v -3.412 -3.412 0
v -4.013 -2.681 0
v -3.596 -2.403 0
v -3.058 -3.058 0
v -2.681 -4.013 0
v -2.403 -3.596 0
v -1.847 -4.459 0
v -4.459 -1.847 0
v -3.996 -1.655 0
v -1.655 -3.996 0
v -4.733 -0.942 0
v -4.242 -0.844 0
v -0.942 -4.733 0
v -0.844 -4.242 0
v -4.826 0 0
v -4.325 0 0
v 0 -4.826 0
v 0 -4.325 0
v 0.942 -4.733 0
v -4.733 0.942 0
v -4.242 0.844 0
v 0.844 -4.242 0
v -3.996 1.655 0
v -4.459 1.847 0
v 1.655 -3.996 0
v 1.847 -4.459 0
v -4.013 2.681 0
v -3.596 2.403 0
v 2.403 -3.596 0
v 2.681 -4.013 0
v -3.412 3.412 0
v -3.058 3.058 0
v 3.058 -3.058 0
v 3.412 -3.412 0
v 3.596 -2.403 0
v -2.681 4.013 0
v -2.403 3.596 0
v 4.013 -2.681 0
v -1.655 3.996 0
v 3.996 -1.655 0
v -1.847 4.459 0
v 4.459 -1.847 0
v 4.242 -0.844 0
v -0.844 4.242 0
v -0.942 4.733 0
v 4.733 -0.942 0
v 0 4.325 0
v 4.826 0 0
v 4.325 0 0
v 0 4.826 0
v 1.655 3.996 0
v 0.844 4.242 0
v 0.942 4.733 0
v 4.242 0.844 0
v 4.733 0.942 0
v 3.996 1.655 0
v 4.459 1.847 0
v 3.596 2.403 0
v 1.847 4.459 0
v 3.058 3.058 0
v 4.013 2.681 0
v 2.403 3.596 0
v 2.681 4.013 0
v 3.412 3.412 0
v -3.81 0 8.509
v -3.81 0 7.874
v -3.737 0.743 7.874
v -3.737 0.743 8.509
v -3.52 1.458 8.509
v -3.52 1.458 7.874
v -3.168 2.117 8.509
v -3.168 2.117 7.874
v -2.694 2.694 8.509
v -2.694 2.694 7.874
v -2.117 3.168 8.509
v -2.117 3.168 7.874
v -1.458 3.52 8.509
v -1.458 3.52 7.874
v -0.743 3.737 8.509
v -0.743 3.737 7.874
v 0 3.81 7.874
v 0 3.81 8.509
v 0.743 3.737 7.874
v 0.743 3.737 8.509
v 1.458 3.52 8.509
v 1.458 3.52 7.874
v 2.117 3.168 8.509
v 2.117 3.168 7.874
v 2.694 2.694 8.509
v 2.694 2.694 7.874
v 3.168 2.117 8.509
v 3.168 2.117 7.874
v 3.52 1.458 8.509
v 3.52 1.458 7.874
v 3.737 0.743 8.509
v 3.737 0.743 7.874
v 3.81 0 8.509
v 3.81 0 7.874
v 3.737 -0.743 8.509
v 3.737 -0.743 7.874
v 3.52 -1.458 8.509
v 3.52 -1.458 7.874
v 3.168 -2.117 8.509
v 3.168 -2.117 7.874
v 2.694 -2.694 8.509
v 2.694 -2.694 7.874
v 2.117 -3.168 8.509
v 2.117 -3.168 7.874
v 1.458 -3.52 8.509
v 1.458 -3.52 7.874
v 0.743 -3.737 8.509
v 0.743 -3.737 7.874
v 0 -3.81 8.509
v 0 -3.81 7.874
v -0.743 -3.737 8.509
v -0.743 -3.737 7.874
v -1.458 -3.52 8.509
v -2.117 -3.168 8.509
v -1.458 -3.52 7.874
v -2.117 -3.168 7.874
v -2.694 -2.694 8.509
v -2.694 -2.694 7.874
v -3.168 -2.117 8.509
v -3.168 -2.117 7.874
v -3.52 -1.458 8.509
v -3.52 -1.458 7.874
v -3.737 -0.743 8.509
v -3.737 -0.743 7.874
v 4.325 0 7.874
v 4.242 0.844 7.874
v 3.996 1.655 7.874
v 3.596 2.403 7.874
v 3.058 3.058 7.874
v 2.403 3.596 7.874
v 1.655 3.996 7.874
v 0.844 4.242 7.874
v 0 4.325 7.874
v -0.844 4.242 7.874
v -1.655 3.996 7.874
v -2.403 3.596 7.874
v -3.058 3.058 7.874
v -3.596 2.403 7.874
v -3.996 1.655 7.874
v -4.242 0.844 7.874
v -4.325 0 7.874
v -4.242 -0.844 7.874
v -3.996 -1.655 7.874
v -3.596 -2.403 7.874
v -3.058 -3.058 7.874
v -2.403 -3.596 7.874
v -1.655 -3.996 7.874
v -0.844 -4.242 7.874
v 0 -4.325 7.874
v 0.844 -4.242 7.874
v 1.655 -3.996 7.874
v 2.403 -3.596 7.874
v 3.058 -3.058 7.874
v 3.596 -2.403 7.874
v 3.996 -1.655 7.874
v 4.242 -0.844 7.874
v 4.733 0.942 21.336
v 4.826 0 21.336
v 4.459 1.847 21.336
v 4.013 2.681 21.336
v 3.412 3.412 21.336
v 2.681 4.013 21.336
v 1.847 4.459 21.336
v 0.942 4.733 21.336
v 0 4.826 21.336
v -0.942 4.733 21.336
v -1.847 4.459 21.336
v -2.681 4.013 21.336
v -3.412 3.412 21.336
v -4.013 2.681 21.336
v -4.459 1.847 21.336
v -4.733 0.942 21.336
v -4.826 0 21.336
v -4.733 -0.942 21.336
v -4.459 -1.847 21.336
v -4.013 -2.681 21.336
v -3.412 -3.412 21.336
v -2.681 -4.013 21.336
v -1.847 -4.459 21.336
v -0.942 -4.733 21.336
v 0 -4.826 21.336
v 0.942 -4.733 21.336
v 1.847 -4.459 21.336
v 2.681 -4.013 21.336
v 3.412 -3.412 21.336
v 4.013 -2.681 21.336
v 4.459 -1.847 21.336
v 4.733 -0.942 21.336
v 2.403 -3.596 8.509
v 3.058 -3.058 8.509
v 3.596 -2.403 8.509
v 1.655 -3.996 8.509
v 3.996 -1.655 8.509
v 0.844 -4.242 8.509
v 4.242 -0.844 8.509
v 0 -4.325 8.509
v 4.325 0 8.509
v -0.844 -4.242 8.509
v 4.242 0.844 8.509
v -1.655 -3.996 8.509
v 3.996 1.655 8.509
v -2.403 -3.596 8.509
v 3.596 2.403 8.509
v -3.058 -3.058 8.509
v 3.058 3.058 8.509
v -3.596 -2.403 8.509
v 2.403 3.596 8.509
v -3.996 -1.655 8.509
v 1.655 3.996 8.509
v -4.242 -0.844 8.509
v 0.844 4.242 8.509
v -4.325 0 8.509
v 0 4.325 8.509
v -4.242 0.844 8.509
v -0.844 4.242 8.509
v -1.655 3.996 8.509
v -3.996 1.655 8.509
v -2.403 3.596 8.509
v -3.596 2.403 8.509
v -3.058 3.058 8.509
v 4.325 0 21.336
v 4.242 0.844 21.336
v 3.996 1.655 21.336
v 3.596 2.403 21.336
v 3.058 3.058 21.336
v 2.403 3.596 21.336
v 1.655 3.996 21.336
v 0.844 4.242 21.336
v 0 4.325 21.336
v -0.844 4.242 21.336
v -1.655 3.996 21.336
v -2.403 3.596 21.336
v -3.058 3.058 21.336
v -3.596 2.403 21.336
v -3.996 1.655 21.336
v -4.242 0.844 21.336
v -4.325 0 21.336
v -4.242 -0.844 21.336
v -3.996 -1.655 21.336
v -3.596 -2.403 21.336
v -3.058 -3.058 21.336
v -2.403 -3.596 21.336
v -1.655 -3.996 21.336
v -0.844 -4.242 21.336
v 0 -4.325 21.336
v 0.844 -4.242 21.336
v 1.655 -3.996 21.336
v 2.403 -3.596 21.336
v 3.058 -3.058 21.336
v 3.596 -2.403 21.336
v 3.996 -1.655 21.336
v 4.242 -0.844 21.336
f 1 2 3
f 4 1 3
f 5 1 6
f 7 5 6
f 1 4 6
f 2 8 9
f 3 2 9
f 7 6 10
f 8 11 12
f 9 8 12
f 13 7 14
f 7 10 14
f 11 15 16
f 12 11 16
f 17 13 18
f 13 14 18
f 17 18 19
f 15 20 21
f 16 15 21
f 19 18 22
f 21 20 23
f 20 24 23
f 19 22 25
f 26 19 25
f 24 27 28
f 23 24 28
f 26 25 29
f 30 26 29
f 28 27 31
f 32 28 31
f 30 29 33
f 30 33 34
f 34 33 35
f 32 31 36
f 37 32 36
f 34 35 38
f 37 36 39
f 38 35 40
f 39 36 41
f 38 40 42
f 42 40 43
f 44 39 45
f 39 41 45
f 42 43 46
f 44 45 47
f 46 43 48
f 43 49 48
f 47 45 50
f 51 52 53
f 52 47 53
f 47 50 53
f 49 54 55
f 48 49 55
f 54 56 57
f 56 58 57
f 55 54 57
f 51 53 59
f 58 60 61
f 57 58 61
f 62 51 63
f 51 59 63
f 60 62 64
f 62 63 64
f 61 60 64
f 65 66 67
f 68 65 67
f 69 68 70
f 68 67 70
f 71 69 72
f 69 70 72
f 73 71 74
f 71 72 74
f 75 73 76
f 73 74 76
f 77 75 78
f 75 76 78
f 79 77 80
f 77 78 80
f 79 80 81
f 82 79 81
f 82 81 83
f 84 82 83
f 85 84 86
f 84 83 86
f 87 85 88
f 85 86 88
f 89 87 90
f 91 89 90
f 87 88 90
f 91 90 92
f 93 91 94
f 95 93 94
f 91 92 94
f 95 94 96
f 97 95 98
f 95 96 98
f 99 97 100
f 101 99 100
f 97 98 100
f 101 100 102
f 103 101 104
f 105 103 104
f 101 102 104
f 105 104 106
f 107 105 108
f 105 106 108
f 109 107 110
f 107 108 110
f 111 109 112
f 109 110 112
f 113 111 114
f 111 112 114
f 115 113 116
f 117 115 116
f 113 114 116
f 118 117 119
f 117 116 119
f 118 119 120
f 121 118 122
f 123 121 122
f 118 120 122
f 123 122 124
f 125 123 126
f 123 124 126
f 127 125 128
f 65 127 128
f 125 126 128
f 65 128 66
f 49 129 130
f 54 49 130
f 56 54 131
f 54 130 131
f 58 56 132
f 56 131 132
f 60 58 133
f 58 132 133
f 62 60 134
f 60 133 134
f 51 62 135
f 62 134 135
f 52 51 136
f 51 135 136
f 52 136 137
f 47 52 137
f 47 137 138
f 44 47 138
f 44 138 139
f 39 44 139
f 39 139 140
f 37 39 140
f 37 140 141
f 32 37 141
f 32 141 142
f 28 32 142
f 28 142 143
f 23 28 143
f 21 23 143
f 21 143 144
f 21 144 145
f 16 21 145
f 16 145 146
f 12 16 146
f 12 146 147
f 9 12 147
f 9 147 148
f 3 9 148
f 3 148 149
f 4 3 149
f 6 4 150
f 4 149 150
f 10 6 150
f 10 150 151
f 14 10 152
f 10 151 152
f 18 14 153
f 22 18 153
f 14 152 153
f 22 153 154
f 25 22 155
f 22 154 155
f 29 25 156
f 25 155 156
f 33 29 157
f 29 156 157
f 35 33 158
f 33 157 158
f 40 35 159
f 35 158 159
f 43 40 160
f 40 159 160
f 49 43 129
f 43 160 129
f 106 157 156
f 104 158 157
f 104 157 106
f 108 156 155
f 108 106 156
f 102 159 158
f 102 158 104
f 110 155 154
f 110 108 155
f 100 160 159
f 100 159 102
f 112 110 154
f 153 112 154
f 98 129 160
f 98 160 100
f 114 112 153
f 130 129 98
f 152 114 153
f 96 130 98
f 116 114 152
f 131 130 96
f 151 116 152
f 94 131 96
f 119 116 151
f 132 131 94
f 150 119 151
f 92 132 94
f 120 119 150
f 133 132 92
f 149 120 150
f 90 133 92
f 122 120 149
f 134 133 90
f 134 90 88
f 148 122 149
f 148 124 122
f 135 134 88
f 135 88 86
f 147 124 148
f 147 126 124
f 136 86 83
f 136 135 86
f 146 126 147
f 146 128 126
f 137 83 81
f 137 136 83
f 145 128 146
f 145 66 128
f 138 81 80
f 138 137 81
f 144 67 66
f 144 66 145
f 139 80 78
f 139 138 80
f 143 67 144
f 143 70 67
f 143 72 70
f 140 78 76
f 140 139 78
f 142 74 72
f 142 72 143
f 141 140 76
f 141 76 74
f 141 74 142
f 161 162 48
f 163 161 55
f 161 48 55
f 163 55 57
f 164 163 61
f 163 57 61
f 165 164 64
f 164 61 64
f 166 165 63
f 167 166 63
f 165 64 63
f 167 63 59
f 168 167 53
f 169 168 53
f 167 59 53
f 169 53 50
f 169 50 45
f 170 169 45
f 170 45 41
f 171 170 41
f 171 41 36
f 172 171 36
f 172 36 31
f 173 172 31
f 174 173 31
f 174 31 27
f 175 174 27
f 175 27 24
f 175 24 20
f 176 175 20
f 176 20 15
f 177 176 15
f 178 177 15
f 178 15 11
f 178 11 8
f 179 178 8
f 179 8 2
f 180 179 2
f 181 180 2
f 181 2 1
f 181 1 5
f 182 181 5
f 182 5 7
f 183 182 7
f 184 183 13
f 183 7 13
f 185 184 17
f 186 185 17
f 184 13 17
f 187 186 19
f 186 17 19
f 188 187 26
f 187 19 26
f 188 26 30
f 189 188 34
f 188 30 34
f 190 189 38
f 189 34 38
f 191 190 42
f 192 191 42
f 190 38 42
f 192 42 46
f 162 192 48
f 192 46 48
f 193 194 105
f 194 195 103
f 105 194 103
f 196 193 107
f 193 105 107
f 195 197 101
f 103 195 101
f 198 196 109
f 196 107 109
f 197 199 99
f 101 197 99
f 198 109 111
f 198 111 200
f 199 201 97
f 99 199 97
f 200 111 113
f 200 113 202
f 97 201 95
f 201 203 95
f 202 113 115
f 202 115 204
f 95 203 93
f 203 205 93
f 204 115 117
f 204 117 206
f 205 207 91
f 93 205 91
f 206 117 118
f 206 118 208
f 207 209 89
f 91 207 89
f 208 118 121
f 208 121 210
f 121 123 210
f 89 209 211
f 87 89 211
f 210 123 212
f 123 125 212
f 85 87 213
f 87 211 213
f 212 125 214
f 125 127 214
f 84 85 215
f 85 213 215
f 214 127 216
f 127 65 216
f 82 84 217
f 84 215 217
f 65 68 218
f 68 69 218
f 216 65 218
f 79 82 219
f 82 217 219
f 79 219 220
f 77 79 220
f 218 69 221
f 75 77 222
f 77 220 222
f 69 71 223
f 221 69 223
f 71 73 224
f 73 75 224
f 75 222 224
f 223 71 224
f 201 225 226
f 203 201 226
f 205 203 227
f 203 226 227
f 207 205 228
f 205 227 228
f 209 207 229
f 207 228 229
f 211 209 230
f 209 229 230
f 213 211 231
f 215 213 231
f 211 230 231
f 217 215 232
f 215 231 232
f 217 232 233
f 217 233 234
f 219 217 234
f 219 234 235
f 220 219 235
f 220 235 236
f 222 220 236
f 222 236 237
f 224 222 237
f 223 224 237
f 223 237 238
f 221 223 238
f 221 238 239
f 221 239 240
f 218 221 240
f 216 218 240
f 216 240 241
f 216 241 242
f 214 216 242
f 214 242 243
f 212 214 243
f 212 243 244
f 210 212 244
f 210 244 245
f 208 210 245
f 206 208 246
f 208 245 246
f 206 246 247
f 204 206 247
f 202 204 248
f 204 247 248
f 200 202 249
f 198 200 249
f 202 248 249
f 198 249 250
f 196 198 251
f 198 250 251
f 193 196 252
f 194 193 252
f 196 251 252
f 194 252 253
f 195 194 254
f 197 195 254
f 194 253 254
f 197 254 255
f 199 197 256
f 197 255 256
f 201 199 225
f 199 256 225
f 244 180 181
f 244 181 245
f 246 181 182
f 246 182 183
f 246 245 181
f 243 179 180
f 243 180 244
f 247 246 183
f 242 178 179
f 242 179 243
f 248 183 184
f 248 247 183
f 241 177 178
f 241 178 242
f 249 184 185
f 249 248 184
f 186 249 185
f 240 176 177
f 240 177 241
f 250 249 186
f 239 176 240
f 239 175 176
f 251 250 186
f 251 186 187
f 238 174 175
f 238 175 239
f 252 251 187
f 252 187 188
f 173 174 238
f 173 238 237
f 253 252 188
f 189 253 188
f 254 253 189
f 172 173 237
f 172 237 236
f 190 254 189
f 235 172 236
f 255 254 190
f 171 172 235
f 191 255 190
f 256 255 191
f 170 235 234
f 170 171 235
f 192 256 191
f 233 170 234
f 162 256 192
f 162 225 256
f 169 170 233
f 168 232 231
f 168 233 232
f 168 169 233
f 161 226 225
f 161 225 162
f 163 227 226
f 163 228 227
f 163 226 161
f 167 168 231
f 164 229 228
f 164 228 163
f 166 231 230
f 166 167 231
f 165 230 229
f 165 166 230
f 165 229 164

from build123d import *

# Parameters (mm, degrees)
SKETCH1_R           = 4.826
BOSS_EXTRUDE1_DEPTH = 30.988
SKETCH2_R           = 4.325
CUT_EXTRUDE1_DEPTH  = 37
SKETCH3_R           = 4.826
SKETCH3_R_2         = 4.325
CUT_EXTRUDE2_DEPTH  = 9.652
SKETCH5_R           = 4.325
SKETCH5_R_2         = 3.81
BOSS_EXTRUDE3_DEPTH = 0.635


with BuildPart() as part:
    # Sketch1 → Boss-Extrude1 (new body)
    with BuildSketch(Plane.XY):
        Circle(SKETCH1_R)
    extrude(amount=BOSS_EXTRUDE1_DEPTH)

    # Sketch2 → Cut-Extrude1 (cut)
    with BuildSketch(Plane.XY.offset(30.988)):
        Circle(SKETCH2_R)
    extrude(amount=-CUT_EXTRUDE1_DEPTH, mode=Mode.SUBTRACT)

    # Sketch3 → Cut-Extrude2 (cut)
    with BuildSketch(Plane.XY.offset(30.988)):
        Circle(SKETCH3_R)
        Circle(SKETCH3_R_2, mode=Mode.SUBTRACT)
    extrude(amount=-CUT_EXTRUDE2_DEPTH, mode=Mode.SUBTRACT)

    # Sketch5 → Boss-Extrude3 (add)
    with BuildSketch(Plane(origin=(0, 0, 7.874), x_dir=(-1, 0, 0), z_dir=(0, 0, -1))):
        Circle(SKETCH5_R)
        Circle(SKETCH5_R_2, mode=Mode.SUBTRACT)
    extrude(amount=-BOSS_EXTRUDE3_DEPTH)


solid = part.part
